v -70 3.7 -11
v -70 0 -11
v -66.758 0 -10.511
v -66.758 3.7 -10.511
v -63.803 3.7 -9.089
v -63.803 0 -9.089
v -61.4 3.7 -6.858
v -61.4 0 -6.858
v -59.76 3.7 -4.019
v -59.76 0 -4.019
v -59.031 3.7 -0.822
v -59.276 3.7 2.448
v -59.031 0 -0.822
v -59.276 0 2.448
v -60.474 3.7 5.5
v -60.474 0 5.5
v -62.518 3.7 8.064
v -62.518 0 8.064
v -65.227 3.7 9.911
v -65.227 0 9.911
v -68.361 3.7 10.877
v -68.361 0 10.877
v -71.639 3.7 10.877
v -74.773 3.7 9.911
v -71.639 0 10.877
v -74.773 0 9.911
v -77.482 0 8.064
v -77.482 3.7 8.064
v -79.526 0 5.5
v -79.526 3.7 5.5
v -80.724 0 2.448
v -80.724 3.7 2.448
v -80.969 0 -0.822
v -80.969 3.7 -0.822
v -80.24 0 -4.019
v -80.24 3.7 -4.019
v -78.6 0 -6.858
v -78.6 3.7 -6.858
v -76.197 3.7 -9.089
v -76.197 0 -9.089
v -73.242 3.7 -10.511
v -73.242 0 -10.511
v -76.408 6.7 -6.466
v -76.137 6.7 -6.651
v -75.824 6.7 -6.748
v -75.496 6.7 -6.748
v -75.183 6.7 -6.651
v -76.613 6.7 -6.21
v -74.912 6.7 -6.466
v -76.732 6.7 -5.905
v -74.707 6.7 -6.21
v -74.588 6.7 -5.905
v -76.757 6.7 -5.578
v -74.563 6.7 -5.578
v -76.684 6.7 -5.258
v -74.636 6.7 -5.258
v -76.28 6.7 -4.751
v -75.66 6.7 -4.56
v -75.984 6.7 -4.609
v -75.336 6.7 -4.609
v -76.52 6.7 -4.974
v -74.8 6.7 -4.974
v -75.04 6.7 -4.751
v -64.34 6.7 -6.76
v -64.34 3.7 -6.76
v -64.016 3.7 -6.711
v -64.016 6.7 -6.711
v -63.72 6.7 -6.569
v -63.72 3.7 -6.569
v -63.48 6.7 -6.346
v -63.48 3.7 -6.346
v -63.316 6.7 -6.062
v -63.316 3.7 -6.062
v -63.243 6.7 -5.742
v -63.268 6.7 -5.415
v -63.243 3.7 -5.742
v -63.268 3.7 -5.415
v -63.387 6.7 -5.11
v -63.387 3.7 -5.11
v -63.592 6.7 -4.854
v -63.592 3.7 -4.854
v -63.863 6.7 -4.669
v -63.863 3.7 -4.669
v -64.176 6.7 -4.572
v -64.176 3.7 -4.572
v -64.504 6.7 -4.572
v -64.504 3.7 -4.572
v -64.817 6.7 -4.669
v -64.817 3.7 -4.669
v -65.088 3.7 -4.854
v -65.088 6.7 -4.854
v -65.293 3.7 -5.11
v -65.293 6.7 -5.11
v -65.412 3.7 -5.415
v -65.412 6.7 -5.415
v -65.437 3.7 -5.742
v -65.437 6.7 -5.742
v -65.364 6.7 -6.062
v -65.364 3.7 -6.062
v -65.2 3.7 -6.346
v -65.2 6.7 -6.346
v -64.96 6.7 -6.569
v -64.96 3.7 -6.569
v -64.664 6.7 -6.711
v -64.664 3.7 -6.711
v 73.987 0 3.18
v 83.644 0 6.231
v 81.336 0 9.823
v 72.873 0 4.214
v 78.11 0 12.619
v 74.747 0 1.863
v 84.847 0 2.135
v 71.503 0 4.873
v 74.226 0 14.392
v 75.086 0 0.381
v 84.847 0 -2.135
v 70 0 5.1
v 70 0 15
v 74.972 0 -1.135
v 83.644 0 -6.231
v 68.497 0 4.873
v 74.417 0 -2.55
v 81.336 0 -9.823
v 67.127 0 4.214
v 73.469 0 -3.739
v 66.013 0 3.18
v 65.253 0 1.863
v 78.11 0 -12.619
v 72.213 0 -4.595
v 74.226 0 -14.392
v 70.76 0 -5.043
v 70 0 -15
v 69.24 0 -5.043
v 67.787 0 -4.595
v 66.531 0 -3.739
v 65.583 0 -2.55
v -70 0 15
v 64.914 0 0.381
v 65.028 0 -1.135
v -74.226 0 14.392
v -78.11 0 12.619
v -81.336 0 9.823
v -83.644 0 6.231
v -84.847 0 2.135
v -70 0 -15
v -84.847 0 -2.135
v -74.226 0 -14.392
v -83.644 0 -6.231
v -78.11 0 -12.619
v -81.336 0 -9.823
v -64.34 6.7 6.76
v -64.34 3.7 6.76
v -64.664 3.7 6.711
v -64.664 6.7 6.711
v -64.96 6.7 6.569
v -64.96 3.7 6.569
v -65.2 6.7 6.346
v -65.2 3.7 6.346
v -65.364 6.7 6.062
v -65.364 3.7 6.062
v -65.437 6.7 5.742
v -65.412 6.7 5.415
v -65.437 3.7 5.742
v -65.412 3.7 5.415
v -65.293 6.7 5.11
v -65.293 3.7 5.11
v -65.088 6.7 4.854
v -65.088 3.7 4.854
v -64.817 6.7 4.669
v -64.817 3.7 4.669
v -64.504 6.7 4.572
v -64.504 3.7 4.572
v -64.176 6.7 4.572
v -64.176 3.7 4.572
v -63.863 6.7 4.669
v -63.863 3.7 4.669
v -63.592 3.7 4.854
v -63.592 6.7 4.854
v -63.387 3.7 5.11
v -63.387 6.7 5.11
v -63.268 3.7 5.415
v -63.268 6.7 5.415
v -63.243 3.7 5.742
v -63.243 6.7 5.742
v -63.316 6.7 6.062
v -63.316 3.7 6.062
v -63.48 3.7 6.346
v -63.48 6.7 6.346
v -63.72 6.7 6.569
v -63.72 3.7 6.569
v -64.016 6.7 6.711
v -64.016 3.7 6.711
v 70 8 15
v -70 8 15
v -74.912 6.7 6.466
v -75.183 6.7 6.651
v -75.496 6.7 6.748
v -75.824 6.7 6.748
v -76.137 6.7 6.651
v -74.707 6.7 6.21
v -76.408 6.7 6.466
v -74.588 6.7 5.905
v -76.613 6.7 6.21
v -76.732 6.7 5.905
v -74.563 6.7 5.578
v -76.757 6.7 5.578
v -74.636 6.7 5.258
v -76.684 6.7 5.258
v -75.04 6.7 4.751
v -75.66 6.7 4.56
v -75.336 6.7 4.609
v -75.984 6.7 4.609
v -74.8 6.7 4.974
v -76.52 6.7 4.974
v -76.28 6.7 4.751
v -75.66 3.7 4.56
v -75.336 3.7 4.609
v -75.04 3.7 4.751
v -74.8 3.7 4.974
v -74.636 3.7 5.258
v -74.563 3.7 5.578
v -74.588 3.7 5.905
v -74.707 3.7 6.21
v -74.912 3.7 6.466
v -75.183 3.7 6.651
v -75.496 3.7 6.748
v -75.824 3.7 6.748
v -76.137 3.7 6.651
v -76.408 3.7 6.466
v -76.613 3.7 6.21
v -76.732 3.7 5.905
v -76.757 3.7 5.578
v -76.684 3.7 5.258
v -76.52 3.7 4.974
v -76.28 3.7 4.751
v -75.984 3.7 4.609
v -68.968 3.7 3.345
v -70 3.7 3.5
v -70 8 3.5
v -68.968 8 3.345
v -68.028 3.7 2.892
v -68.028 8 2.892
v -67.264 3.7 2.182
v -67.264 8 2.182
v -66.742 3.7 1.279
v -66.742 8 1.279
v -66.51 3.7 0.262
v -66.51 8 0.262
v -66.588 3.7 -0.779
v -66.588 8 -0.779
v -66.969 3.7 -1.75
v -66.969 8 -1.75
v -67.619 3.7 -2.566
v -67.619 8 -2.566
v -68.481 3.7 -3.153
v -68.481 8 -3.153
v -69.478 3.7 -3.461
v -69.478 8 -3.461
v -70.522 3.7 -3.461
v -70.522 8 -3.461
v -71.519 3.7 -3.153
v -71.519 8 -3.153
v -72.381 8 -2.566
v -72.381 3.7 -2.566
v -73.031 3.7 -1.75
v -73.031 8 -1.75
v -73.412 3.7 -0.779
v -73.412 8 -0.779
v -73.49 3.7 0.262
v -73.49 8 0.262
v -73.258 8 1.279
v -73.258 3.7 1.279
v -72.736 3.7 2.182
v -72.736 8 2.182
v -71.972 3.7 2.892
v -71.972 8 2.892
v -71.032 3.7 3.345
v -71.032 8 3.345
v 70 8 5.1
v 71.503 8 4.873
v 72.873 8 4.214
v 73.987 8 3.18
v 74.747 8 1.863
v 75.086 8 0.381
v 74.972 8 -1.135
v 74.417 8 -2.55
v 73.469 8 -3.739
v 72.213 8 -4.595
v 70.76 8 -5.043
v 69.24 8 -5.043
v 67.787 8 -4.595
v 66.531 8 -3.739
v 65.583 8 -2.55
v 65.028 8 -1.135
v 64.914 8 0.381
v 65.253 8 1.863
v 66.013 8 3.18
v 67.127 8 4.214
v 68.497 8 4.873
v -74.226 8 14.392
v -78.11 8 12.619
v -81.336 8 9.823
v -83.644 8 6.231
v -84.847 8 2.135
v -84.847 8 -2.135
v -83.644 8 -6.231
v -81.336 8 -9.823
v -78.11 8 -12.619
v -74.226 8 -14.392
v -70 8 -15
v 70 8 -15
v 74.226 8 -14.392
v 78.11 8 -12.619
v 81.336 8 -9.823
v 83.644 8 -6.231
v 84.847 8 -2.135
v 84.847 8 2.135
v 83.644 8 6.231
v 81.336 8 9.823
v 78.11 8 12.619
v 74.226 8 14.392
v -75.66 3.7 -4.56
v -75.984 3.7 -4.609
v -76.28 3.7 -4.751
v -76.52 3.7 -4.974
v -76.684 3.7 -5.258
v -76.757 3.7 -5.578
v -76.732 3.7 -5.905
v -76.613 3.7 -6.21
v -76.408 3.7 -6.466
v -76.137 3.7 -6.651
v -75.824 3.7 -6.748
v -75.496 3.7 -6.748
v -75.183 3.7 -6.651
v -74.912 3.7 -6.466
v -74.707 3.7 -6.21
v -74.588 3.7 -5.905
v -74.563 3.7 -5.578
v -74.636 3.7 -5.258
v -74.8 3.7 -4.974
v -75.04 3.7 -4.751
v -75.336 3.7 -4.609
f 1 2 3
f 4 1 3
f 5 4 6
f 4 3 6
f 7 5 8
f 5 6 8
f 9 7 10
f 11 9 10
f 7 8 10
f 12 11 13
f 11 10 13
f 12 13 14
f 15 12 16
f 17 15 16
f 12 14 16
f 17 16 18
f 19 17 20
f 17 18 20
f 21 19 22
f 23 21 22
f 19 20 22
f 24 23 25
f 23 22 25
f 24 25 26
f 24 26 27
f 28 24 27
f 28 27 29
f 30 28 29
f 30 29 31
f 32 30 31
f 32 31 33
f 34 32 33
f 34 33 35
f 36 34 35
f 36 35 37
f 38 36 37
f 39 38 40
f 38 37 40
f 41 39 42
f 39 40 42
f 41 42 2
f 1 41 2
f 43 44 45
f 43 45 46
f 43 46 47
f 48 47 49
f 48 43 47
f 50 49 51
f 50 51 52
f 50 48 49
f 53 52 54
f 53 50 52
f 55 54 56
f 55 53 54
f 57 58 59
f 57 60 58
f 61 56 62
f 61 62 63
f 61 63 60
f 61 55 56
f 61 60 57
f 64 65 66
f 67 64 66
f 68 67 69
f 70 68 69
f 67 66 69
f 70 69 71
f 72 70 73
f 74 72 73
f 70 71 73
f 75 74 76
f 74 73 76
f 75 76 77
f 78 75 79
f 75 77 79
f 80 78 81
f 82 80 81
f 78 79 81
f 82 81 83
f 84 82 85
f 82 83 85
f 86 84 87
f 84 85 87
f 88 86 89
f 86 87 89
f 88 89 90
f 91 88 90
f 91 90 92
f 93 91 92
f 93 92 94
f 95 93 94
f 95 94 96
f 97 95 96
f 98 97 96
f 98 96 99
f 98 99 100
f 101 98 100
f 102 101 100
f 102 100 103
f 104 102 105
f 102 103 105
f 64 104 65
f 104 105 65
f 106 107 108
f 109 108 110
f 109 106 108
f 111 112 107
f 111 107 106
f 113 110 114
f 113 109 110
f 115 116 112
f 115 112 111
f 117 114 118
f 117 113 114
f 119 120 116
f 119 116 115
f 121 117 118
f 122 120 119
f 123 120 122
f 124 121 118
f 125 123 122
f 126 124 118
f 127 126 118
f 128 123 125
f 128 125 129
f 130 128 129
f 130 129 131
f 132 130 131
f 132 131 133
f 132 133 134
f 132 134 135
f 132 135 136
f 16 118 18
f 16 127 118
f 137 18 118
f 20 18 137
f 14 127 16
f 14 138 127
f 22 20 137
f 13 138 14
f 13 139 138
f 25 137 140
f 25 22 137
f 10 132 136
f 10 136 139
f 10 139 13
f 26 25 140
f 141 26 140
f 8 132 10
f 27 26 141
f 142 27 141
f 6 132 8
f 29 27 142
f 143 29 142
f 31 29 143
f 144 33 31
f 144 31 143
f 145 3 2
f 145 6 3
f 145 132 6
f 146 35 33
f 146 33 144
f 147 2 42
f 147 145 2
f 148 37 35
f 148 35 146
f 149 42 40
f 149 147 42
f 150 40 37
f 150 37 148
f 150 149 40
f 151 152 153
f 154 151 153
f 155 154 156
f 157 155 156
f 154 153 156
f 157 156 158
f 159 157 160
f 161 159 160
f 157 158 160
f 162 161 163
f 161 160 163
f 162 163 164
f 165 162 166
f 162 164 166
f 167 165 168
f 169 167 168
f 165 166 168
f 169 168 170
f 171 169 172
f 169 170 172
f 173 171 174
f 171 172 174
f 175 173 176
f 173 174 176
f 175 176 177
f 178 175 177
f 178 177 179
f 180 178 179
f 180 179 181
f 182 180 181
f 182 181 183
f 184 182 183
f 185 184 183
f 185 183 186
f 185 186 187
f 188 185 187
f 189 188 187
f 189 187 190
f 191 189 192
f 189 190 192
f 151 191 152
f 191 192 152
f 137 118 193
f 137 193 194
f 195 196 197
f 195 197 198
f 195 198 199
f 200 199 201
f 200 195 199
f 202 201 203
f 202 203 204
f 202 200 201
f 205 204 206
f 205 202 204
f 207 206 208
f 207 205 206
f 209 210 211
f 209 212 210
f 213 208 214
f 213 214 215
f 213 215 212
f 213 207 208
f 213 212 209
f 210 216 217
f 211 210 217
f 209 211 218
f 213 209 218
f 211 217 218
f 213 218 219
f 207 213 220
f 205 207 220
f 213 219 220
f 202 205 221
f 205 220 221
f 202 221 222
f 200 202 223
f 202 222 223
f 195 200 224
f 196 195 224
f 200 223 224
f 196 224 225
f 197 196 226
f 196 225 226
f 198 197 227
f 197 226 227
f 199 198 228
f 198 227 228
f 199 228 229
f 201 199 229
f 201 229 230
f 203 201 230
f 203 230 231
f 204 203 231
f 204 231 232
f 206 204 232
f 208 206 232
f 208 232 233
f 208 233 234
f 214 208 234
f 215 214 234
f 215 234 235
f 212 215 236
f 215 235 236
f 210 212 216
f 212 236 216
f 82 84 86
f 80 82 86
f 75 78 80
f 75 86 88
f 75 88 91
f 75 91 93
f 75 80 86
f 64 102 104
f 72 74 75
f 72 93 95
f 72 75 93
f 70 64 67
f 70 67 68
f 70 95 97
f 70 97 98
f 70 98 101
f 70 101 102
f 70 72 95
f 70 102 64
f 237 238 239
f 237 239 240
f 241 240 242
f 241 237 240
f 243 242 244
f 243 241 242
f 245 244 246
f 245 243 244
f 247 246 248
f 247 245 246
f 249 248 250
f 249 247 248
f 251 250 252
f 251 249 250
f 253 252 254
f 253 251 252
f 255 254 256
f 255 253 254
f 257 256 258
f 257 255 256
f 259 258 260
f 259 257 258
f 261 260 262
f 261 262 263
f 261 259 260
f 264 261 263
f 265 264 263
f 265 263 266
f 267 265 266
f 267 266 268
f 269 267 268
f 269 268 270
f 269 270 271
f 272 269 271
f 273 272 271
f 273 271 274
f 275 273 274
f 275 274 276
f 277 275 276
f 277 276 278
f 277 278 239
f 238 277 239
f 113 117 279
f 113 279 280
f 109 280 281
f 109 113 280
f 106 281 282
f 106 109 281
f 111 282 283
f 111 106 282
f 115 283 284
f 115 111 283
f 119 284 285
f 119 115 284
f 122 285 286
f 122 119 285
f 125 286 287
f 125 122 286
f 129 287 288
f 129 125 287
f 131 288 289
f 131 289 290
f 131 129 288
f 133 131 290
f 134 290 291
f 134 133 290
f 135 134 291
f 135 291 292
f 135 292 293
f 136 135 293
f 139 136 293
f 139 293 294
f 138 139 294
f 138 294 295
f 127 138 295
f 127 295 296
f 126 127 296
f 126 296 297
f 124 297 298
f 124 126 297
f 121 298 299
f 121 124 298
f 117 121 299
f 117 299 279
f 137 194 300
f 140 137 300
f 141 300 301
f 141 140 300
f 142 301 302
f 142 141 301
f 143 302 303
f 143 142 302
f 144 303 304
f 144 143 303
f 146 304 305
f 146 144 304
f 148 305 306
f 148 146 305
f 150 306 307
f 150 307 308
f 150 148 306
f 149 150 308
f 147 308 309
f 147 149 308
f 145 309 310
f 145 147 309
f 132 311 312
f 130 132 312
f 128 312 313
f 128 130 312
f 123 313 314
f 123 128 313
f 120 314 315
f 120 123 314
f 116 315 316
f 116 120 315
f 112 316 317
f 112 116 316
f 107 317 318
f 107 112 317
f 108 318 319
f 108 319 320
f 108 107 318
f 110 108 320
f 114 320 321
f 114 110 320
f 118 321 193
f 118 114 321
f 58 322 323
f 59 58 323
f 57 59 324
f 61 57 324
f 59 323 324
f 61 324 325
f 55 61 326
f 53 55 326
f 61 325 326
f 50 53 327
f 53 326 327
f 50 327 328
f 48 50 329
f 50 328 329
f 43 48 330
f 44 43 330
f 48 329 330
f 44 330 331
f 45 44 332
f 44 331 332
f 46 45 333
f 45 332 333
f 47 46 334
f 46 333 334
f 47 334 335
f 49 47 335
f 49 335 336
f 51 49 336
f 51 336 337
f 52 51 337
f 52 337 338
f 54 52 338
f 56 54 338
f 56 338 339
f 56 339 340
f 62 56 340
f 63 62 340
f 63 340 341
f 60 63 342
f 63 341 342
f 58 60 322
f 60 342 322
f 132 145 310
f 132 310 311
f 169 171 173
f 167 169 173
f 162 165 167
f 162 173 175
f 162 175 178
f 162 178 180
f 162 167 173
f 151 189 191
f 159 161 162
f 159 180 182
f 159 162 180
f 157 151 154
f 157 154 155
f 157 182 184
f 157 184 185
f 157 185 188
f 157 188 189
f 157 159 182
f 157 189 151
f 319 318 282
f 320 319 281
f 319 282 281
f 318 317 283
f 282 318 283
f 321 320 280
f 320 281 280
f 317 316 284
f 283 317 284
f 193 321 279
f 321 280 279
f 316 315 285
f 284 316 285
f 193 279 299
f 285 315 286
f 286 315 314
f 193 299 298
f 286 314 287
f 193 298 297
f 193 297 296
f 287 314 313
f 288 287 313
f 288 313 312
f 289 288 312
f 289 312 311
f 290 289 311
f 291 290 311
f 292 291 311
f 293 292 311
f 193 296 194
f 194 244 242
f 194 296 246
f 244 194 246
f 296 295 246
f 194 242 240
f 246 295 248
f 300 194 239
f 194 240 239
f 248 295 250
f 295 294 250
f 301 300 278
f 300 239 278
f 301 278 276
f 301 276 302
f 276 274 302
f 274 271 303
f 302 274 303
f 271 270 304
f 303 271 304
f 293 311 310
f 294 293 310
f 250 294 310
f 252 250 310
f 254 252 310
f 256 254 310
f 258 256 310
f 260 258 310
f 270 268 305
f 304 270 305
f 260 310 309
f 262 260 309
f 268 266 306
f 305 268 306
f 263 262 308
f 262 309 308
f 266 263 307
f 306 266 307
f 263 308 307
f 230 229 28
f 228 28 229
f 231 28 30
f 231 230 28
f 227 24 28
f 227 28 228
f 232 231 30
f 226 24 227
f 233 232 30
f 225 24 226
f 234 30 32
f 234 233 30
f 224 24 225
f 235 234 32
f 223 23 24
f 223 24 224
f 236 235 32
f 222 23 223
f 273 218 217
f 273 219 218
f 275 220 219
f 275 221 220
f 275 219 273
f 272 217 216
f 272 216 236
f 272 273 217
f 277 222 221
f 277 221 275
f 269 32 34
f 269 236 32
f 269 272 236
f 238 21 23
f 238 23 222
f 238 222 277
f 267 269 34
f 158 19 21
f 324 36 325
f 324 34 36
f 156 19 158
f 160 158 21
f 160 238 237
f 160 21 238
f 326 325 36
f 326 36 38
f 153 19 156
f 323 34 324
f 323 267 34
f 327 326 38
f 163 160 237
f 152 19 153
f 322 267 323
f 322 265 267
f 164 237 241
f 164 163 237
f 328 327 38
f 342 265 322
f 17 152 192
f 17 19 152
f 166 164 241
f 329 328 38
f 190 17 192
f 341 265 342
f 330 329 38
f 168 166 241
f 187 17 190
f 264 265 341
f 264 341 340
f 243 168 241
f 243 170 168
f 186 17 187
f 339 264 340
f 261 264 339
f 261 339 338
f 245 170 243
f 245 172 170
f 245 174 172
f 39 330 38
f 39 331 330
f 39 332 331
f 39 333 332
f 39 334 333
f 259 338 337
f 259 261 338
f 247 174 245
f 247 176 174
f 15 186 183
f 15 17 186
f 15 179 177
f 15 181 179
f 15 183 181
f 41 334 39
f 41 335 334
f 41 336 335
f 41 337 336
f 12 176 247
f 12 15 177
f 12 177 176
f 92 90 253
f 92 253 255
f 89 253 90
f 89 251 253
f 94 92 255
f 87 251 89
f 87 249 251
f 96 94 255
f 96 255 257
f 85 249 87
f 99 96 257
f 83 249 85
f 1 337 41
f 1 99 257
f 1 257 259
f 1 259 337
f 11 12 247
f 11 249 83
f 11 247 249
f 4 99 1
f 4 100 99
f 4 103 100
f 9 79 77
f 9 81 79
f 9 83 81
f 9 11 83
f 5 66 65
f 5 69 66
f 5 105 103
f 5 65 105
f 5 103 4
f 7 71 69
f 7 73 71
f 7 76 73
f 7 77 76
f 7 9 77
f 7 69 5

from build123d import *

# Parameters (mm, degrees)
SCHIZZO2_R                   = 5.1
SCHIZZO2_R_2                 = 3.5
ESTRUSIONE_ESTRUSIONE1_DEPTH = 8
SCHIZZO4_R                   = 11
TAGLIO_ESTRUSIONE1_DEPTH     = 3.7
SCHIZZO5_R                   = 1.1
TAGLIO_ESTRUSIONE2_DEPTH     = 3


with BuildPart() as part:
    # Schizzo2 → Estrusione-Estrusione1 (new body)
    with BuildSketch(Plane(origin=(0, 0, 0), x_dir=(1, 0, 0), z_dir=(0, 1, 0))):
        with BuildLine():
            Line((70, -15), (-70, -15))
            ThreePointArc((-70, -15), (-85, 0), (-70, 15))
            Line((-70, 15), (70, 15))
            ThreePointArc((70, 15), (85, 0), (70, -15))
        make_face()
        with Locations(Location((70, 0, 0), (0, 0, 270))):
            Circle(SCHIZZO2_R, mode=Mode.SUBTRACT)
        with Locations(Location((-70, 0, 0), (0, 0, 270))):
            Circle(SCHIZZO2_R_2, mode=Mode.SUBTRACT)
    extrude(amount=ESTRUSIONE_ESTRUSIONE1_DEPTH)

    # Schizzo4 → Taglio-Estrusione1 (cut)
    with BuildSketch(Plane.XZ):
        with Locations(Location((-70, 0, 0), (0, 0, 270))):
            Circle(SCHIZZO4_R)
    extrude(amount=-TAGLIO_ESTRUSIONE1_DEPTH, mode=Mode.SUBTRACT)

    # Schizzo5 → Taglio-Estrusione2 (cut)
    with BuildSketch(Plane.XZ.offset(-3.7)):
        with Locations(Location((-75.66, 5.66, 0), (0, 0, 270))):
            Circle(SCHIZZO5_R)
        with Locations(Location((-64.34, 5.66, 0), (0, 0, 90))):
            Circle(SCHIZZO5_R)
        with Locations(Location((-64.34, -5.66, 0), (0, 0, 270))):
            Circle(SCHIZZO5_R)
        with Locations(Location((-75.66, -5.66, 0), (0, 0, 90))):
            Circle(SCHIZZO5_R)
    extrude(amount=-TAGLIO_ESTRUSIONE2_DEPTH, mode=Mode.SUBTRACT)


solid = part.part
